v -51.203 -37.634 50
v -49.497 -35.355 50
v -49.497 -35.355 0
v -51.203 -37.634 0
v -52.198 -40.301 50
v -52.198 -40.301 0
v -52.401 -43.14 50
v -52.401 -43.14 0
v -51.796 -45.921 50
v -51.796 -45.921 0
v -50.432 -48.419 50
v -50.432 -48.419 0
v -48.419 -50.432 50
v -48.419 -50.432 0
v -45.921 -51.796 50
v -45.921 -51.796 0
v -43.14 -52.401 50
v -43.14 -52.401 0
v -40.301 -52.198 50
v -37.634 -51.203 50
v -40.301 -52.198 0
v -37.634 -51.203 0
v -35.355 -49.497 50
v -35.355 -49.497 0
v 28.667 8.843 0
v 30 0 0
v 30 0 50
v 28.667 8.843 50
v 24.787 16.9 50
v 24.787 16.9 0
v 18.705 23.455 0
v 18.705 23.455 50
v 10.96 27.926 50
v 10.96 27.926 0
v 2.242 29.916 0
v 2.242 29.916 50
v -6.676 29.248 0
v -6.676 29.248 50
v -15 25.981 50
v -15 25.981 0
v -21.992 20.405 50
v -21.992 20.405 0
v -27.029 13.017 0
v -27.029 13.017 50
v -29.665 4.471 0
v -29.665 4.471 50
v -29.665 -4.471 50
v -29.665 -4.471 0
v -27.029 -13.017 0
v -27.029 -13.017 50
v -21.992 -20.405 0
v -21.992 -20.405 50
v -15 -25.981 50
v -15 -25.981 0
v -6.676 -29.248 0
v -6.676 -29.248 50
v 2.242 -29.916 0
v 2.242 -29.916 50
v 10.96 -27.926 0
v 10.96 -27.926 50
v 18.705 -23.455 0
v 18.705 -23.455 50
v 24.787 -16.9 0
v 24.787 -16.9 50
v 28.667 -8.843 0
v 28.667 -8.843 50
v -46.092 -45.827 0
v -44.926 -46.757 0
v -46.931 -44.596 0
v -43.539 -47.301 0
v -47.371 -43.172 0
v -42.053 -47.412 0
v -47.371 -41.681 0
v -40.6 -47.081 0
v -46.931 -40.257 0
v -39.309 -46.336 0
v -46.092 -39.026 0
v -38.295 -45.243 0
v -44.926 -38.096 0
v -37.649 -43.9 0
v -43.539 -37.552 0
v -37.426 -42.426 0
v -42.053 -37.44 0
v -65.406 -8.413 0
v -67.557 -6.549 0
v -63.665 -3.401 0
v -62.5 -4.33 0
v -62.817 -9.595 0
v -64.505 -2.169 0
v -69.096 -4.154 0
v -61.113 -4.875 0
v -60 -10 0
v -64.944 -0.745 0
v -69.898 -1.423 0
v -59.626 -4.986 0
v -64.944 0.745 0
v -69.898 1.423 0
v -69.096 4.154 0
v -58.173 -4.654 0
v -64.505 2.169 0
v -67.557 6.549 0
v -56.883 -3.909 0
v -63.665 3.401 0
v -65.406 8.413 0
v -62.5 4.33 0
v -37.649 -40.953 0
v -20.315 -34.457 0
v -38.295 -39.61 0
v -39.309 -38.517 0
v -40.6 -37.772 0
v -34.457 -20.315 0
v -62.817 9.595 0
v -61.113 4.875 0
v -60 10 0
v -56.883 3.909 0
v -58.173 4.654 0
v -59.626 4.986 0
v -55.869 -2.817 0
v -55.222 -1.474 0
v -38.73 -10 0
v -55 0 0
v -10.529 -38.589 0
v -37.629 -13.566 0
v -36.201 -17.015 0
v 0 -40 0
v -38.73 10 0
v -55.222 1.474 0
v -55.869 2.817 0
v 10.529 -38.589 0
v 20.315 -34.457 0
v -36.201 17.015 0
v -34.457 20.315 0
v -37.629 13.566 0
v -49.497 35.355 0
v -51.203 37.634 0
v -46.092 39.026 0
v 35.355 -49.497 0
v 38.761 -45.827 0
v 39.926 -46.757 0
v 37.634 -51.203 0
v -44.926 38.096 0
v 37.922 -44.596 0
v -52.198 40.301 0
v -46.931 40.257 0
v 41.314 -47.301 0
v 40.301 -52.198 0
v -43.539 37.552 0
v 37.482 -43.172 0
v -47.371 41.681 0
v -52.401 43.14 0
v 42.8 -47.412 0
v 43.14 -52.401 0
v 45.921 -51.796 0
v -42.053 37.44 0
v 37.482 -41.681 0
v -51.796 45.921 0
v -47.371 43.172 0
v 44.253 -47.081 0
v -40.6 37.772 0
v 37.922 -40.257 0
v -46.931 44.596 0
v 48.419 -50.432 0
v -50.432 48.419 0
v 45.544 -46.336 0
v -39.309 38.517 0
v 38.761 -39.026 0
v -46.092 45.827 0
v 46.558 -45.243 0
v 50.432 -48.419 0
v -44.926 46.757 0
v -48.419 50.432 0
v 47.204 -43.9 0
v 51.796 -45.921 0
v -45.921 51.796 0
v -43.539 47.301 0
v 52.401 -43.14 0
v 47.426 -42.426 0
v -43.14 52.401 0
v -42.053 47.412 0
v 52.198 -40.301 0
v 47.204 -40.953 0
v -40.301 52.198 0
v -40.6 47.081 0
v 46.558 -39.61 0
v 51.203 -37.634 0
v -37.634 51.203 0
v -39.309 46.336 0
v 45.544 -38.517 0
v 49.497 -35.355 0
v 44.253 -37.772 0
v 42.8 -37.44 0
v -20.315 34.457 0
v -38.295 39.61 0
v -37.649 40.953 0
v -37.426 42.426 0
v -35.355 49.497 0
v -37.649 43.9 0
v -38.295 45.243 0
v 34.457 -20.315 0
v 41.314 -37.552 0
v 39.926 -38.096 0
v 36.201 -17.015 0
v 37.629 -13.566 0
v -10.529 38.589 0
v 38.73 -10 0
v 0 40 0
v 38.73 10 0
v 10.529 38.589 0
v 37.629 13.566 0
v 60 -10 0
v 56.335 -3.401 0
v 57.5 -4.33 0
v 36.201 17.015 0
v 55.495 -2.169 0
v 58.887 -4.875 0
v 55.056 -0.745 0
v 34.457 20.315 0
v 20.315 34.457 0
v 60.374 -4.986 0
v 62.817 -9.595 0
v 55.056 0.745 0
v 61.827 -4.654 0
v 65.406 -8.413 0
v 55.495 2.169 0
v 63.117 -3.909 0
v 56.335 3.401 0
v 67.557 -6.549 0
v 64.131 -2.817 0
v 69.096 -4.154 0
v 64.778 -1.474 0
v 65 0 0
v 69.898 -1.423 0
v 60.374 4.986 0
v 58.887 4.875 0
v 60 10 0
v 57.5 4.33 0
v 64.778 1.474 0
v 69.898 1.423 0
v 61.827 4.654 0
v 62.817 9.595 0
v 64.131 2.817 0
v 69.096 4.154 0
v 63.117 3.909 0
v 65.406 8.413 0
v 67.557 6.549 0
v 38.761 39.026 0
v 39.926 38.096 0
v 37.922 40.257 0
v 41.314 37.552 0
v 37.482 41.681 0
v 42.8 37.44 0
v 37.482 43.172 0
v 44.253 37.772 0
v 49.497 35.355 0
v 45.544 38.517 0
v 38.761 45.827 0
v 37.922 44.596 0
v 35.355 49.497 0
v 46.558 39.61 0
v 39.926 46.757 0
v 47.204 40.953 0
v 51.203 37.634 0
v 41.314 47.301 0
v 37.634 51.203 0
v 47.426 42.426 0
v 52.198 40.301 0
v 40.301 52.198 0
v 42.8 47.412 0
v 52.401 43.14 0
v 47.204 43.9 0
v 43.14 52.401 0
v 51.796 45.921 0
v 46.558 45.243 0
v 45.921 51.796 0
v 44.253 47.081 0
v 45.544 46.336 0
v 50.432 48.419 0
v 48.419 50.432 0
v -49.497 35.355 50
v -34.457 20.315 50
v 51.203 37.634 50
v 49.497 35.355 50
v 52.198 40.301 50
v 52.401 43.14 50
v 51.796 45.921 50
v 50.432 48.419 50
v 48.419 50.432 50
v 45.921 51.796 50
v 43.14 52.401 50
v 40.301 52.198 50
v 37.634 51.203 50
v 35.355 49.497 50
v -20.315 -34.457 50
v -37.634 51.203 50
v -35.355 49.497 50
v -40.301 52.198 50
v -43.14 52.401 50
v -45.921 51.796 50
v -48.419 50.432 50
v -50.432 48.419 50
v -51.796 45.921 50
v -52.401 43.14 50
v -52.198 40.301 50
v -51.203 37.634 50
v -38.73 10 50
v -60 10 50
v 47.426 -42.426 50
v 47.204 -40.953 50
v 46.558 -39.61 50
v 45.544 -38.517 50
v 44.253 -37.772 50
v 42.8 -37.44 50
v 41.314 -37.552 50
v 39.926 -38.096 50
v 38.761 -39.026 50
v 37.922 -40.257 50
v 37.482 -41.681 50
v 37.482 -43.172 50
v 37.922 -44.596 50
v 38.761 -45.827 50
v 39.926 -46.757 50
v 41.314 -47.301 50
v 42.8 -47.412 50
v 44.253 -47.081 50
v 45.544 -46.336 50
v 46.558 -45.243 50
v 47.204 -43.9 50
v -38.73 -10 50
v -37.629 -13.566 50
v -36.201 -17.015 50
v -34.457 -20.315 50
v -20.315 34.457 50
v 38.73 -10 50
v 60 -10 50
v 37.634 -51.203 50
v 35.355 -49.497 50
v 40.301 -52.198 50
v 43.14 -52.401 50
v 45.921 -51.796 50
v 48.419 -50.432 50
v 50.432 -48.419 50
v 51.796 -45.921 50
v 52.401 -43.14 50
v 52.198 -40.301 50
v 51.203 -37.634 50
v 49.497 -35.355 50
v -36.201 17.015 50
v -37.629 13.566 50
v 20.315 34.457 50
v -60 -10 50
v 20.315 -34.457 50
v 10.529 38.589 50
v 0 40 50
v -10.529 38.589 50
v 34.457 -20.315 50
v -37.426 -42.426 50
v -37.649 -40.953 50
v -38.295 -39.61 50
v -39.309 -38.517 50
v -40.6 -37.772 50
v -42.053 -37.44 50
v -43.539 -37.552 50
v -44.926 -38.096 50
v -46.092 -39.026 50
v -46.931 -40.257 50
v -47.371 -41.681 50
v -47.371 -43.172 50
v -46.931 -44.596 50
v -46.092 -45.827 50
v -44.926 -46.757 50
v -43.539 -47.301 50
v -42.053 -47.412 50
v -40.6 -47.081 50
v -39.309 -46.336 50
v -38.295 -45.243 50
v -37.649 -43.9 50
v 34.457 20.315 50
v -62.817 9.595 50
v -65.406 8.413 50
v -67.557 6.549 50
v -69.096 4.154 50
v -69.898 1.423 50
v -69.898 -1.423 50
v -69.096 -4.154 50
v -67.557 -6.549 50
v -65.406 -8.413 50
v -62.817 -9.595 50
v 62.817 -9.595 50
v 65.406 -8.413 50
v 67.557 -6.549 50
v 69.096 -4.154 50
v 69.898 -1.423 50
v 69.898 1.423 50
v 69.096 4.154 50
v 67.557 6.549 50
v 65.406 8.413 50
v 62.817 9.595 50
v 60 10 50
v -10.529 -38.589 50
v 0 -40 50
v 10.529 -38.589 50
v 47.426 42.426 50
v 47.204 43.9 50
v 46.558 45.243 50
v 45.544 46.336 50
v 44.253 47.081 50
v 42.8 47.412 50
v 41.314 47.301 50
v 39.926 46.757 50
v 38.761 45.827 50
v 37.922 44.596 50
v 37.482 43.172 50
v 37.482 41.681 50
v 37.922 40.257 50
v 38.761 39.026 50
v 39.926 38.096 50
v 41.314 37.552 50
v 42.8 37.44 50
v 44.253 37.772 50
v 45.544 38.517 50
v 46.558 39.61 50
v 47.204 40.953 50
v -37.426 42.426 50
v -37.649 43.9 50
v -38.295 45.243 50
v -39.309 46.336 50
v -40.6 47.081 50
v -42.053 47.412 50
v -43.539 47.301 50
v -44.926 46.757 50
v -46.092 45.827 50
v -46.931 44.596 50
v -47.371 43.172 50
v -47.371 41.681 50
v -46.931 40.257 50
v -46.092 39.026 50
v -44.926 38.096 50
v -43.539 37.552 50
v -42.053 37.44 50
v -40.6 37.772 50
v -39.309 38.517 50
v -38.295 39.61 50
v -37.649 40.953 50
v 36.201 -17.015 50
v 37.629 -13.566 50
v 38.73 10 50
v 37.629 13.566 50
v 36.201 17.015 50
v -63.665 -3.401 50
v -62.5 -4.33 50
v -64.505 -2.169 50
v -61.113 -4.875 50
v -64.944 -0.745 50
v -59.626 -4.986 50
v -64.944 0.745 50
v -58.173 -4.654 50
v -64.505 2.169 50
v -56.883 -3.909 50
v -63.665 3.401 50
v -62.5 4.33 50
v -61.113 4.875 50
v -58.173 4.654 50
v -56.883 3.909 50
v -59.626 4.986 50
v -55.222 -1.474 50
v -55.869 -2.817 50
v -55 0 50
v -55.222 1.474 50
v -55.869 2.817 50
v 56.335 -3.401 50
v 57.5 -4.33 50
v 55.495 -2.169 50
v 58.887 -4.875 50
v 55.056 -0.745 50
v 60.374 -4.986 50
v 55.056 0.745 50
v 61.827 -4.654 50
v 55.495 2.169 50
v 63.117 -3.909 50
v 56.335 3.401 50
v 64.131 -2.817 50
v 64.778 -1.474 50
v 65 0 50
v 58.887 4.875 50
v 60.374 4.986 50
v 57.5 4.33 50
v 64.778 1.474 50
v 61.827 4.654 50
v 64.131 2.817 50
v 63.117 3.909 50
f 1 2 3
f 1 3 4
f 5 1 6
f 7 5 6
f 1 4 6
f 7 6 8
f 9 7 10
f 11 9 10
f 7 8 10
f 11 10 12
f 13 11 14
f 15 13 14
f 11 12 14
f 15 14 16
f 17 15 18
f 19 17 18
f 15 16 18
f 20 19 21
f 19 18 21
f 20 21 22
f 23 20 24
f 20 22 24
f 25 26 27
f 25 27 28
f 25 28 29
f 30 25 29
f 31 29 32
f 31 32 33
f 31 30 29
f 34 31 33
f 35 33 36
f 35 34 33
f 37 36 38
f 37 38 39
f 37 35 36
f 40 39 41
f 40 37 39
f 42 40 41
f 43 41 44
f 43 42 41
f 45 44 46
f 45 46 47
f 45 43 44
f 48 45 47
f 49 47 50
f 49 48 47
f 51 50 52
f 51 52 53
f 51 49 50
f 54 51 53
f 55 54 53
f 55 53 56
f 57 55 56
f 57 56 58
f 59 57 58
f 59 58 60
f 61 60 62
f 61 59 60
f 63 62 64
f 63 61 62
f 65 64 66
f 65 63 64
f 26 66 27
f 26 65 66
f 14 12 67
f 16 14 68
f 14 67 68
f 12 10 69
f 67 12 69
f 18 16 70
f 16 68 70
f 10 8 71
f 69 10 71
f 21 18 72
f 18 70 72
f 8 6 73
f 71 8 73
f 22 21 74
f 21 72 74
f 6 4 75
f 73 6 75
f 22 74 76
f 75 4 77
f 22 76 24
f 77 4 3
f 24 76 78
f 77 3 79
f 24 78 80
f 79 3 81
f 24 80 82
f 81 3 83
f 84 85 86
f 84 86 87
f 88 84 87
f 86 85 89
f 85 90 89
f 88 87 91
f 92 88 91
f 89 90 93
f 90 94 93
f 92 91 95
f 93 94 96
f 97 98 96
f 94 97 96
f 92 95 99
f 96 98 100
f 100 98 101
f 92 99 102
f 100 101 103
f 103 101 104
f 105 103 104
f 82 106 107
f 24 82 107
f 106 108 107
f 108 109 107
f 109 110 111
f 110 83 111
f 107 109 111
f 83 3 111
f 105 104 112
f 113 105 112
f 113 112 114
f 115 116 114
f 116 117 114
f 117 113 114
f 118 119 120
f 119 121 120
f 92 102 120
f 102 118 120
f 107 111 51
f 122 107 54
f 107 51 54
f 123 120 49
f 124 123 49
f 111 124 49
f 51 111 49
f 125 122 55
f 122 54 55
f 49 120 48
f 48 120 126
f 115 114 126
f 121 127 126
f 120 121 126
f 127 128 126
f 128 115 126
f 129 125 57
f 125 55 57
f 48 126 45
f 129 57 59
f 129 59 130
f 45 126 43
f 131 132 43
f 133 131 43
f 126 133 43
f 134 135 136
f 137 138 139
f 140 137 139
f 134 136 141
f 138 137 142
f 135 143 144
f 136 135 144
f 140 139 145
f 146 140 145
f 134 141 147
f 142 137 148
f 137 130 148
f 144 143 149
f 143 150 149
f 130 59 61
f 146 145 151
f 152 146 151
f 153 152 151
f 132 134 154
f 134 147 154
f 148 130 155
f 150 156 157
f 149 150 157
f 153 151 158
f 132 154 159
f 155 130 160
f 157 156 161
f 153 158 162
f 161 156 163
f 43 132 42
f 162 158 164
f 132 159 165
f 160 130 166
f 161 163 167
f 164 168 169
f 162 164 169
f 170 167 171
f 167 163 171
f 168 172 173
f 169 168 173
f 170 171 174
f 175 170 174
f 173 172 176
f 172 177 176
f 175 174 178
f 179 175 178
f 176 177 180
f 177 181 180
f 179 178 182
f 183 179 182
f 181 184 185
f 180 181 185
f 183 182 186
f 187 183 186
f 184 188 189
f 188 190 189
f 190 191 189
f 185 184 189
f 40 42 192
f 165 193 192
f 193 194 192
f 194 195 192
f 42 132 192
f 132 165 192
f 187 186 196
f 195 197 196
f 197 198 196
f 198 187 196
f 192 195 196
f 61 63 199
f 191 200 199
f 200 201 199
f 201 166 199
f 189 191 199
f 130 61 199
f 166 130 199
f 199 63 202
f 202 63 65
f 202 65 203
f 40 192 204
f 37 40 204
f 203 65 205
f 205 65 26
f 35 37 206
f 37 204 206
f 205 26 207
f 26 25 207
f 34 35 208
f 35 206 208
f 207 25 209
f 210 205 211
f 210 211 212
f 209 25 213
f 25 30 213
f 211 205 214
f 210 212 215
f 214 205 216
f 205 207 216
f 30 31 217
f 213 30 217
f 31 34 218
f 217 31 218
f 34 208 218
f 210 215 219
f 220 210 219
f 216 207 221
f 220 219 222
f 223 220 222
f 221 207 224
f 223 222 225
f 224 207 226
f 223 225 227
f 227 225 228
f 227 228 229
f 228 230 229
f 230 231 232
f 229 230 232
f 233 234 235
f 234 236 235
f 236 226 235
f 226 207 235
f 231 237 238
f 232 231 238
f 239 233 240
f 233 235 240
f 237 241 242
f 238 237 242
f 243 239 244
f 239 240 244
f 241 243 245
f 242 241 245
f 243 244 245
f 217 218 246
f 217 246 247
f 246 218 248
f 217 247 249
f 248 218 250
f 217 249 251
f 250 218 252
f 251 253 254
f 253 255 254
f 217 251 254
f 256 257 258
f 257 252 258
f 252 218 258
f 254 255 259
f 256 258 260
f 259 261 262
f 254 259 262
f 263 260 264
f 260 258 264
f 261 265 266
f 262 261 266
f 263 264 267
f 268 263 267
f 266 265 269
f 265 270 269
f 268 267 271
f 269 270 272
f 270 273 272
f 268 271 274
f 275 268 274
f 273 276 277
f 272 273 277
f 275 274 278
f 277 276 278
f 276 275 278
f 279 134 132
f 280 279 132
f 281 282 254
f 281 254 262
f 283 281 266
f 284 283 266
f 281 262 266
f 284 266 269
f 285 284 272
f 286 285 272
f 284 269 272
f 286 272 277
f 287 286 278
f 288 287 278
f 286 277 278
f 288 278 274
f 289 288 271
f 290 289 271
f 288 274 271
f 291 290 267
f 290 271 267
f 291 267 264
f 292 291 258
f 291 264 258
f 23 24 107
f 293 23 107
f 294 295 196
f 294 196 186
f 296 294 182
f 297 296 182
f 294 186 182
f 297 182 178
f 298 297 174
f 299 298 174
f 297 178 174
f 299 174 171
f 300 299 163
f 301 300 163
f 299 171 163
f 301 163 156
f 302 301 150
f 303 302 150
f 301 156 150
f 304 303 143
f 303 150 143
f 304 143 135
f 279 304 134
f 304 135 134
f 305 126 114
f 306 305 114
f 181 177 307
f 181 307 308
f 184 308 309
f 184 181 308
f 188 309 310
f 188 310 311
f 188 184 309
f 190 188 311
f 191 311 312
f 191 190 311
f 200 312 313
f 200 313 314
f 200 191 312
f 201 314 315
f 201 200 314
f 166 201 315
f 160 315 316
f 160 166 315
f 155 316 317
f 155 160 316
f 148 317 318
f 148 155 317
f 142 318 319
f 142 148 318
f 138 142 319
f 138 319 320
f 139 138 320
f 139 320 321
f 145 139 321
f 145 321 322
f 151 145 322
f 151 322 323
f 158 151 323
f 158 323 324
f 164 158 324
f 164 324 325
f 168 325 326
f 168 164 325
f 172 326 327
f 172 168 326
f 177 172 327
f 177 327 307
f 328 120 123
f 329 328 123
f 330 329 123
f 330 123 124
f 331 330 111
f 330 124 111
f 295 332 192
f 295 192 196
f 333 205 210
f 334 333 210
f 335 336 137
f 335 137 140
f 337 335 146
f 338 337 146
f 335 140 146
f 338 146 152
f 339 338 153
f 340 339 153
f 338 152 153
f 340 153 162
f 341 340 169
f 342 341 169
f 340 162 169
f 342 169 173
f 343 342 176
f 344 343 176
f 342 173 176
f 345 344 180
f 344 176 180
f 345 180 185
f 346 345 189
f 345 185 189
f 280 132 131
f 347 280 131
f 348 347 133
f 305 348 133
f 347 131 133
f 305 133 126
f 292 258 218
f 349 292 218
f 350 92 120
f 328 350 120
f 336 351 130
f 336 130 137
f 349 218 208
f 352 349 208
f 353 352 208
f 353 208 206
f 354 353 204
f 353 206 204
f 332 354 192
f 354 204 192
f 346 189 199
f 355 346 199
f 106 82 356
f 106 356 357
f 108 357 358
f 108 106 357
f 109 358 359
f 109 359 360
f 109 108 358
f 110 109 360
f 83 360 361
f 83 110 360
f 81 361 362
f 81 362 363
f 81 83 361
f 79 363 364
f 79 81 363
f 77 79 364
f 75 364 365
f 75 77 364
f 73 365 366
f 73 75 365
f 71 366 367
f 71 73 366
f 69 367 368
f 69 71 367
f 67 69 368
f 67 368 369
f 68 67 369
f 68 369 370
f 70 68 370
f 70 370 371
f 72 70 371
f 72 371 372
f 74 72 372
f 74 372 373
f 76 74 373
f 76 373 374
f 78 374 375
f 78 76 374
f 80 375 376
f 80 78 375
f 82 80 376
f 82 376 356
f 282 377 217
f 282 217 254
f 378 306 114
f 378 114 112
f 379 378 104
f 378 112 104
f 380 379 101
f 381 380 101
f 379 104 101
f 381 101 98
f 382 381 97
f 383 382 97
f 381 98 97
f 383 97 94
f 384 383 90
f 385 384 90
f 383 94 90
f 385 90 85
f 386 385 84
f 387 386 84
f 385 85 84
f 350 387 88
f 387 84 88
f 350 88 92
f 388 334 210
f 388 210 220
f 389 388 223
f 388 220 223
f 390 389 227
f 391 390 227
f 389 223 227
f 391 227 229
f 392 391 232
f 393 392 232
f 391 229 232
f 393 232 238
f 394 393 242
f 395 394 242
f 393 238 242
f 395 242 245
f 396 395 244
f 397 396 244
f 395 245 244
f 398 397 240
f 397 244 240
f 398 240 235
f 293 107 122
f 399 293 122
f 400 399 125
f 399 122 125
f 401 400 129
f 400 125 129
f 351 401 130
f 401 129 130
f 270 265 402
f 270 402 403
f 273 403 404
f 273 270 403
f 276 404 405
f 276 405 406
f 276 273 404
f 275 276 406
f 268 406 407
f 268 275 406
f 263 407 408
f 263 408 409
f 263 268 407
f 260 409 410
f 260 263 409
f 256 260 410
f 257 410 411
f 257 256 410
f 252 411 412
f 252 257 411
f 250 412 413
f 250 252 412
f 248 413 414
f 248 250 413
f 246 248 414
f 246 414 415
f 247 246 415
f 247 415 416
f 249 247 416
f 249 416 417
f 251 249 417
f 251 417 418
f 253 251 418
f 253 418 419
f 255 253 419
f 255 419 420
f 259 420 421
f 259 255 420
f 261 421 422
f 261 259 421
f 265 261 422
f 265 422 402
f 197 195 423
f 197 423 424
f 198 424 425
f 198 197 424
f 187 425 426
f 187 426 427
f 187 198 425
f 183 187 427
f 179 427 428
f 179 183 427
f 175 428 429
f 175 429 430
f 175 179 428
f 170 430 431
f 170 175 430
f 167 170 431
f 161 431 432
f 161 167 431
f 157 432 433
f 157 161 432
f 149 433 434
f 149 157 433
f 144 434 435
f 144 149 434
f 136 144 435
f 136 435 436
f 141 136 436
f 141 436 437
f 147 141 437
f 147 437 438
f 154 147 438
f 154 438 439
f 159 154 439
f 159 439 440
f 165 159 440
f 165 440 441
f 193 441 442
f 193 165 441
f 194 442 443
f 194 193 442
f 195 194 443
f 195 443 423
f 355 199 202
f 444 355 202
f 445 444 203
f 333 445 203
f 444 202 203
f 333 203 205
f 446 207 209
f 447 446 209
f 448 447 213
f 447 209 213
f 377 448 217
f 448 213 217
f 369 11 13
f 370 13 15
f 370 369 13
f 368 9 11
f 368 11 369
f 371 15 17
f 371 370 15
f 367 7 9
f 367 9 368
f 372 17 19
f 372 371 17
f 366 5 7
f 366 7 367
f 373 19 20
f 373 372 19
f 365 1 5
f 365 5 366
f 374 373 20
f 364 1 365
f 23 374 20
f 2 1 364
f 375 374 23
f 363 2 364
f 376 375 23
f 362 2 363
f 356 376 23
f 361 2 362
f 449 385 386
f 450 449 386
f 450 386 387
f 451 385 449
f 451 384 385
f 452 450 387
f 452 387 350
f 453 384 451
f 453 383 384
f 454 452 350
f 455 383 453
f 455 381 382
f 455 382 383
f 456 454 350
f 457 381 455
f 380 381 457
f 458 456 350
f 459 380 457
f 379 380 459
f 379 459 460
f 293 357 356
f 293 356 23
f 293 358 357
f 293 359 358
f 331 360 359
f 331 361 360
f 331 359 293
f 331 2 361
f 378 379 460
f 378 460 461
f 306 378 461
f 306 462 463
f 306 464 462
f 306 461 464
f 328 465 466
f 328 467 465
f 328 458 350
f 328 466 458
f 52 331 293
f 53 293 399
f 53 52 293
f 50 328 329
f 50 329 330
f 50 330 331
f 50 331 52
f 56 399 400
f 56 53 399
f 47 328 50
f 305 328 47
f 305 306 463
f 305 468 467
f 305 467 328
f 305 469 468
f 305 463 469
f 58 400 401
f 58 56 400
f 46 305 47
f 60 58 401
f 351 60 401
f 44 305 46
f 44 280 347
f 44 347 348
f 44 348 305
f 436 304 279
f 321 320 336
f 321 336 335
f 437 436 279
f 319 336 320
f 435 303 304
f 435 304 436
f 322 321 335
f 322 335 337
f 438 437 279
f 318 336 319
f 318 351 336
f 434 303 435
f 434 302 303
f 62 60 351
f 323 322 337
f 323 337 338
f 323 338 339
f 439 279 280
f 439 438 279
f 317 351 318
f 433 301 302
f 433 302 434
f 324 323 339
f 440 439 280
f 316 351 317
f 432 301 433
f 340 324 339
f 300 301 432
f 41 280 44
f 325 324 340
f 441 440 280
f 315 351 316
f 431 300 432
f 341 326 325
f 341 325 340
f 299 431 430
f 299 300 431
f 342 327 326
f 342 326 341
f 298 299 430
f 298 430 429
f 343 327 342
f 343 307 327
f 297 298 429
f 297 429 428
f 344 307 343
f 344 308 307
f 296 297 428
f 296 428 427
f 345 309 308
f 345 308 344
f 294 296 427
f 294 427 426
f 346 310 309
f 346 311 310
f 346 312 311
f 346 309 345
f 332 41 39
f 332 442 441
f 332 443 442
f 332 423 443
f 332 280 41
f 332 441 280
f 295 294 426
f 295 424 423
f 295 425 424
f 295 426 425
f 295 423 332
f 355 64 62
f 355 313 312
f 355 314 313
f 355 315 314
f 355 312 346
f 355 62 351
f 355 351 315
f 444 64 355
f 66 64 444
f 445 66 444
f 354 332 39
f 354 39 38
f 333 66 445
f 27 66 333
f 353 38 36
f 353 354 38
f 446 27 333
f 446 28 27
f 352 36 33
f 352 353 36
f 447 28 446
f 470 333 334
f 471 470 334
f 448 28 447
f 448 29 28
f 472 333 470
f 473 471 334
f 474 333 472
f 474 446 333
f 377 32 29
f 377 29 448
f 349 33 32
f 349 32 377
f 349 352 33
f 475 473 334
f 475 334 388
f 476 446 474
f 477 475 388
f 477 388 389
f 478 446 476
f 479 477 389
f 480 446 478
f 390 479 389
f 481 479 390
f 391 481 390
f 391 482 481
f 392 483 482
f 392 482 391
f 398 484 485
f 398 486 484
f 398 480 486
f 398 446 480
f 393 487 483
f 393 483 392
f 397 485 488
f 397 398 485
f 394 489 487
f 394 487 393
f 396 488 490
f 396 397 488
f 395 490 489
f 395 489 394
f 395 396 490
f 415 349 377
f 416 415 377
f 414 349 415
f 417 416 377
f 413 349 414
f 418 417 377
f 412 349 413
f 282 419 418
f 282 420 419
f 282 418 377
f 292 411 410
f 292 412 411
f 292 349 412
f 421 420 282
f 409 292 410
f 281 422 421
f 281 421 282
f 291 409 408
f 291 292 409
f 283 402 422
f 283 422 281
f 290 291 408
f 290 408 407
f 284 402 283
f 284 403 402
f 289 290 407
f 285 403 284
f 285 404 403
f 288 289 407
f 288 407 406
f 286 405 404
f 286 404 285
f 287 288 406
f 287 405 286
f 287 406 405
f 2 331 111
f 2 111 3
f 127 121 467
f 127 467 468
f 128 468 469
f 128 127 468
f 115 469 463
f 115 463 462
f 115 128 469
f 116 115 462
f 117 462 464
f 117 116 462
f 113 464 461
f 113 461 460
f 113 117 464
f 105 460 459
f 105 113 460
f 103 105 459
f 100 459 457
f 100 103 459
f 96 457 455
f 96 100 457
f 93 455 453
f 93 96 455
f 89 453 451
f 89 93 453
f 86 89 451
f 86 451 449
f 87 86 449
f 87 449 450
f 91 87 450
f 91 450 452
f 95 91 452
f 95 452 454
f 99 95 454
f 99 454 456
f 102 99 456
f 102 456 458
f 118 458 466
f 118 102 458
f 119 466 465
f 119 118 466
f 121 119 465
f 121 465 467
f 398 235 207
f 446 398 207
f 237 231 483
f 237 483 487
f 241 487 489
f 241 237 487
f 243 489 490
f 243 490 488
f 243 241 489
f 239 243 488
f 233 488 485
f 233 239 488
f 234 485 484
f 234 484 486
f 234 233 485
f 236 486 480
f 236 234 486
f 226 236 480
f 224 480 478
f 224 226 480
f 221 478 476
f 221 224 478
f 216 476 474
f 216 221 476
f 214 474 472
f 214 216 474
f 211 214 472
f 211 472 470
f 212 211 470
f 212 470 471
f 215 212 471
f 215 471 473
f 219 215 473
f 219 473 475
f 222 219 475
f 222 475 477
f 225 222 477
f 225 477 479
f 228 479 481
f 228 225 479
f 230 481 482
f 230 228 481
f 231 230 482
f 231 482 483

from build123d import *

# Parameters (mm, degrees)
SKETCH1_R           = 40
SKETCH1_R_2         = 30
SKETCH1_R_3         = 5
BOSS_EXTRUDE1_DEPTH = 50


with BuildPart() as part:
    # Sketch1 → Boss-Extrude1 (new body)
    # profile 1 of 7: a face of its own
    with BuildSketch(Plane.XY):
        Circle(SKETCH1_R)
        Circle(SKETCH1_R_2, mode=Mode.SUBTRACT)
    # profile 2 of 7: a face of its own
    with BuildSketch(Plane.XY):
        with BuildLine():
            ThreePointArc((-34.457195687, 20.315060063), (-28.284271247, 28.284271247), (-20.315060063, 34.457195687))
            Line((-20.315060063, 34.457195687), (-35.355339059, 49.497474683))
            ThreePointArc((-35.355339059, 49.497474683), (-49.497474683, 49.497474683), (-49.497474683, 35.355339059))
            Line((-49.497474683, 35.355339059), (-34.457195687, 20.315060063))
        make_face()
        with Locations((-42.426406871, 42.426406871)):
            Circle(SKETCH1_R_3, mode=Mode.SUBTRACT)
    # profile 3 of 7: a face of its own
    with BuildSketch(Plane.XY):
        with BuildLine():
            ThreePointArc((-38.729833462, -10), (-40, 0), (-38.729833462, 10))
            Line((-38.729833462, 10), (-60, 10))
            ThreePointArc((-60, 10), (-70, 0), (-60, -10))
            Line((-60, -10), (-38.729833462, -10))
        make_face()
        with Locations((-60, 0)):
            Circle(SKETCH1_R_3, mode=Mode.SUBTRACT)
    # profile 4 of 7: a face of its own
    with BuildSketch(Plane.XY):
        with BuildLine():
            Line((-35.355339059, -49.497474683), (-20.315060063, -34.457195687))
            ThreePointArc((-20.315060063, -34.457195687), (-28.284271247, -28.284271247), (-34.457195687, -20.315060063))
            Line((-34.457195687, -20.315060063), (-49.497474683, -35.355339059))
            ThreePointArc((-49.497474683, -35.355339059), (-49.497474683, -49.497474683), (-35.355339059, -49.497474683))
        make_face()
        with Locations((-42.426406871, -42.426406871)):
            Circle(SKETCH1_R_3, mode=Mode.SUBTRACT)
    # profile 5 of 7: a face of its own
    with BuildSketch(Plane.XY):
        with BuildLine():
            Line((49.497474683, -35.355339059), (34.457195687, -20.315060063))
            ThreePointArc((34.457195687, -20.315060063), (28.284271247, -28.284271247), (20.315060063, -34.457195687))
            Line((20.315060063, -34.457195687), (35.355339059, -49.497474683))
            ThreePointArc((35.355339059, -49.497474683), (49.497474683, -49.497474683), (49.497474683, -35.355339059))
        make_face()
        with Locations((42.426406871, -42.426406871)):
            Circle(SKETCH1_R_3, mode=Mode.SUBTRACT)
    # profile 6 of 7: a face of its own
    with BuildSketch(Plane.XY):
        with BuildLine():
            Line((60, 10), (38.729833462, 10))
            ThreePointArc((38.729833462, 10), (39.681187851, 5.040171699), (40, 0))
            ThreePointArc((40, 0), (39.681187851, -5.040171699), (38.729833462, -10))
            Line((38.729833462, -10), (60, -10))
            ThreePointArc((60, -10), (70, 0), (60, 10))
        make_face()
        with Locations((60, 0)):
            Circle(SKETCH1_R_3, mode=Mode.SUBTRACT)
    # profile 7 of 7: a face of its own
    with BuildSketch(Plane.XY):
        with BuildLine():
            ThreePointArc((20.315060063, 34.457195687), (28.284271247, 28.284271247), (34.457195687, 20.315060063))
            Line((34.457195687, 20.315060063), (49.497474683, 35.355339059))
            ThreePointArc((49.497474683, 35.355339059), (49.497474683, 49.497474683), (35.355339059, 49.497474683))
            Line((35.355339059, 49.497474683), (20.315060063, 34.457195687))
        make_face()
        with Locations((42.426406871, 42.426406871)):
            Circle(SKETCH1_R_3, mode=Mode.SUBTRACT)
    extrude(amount=BOSS_EXTRUDE1_DEPTH)


solid = part.part
